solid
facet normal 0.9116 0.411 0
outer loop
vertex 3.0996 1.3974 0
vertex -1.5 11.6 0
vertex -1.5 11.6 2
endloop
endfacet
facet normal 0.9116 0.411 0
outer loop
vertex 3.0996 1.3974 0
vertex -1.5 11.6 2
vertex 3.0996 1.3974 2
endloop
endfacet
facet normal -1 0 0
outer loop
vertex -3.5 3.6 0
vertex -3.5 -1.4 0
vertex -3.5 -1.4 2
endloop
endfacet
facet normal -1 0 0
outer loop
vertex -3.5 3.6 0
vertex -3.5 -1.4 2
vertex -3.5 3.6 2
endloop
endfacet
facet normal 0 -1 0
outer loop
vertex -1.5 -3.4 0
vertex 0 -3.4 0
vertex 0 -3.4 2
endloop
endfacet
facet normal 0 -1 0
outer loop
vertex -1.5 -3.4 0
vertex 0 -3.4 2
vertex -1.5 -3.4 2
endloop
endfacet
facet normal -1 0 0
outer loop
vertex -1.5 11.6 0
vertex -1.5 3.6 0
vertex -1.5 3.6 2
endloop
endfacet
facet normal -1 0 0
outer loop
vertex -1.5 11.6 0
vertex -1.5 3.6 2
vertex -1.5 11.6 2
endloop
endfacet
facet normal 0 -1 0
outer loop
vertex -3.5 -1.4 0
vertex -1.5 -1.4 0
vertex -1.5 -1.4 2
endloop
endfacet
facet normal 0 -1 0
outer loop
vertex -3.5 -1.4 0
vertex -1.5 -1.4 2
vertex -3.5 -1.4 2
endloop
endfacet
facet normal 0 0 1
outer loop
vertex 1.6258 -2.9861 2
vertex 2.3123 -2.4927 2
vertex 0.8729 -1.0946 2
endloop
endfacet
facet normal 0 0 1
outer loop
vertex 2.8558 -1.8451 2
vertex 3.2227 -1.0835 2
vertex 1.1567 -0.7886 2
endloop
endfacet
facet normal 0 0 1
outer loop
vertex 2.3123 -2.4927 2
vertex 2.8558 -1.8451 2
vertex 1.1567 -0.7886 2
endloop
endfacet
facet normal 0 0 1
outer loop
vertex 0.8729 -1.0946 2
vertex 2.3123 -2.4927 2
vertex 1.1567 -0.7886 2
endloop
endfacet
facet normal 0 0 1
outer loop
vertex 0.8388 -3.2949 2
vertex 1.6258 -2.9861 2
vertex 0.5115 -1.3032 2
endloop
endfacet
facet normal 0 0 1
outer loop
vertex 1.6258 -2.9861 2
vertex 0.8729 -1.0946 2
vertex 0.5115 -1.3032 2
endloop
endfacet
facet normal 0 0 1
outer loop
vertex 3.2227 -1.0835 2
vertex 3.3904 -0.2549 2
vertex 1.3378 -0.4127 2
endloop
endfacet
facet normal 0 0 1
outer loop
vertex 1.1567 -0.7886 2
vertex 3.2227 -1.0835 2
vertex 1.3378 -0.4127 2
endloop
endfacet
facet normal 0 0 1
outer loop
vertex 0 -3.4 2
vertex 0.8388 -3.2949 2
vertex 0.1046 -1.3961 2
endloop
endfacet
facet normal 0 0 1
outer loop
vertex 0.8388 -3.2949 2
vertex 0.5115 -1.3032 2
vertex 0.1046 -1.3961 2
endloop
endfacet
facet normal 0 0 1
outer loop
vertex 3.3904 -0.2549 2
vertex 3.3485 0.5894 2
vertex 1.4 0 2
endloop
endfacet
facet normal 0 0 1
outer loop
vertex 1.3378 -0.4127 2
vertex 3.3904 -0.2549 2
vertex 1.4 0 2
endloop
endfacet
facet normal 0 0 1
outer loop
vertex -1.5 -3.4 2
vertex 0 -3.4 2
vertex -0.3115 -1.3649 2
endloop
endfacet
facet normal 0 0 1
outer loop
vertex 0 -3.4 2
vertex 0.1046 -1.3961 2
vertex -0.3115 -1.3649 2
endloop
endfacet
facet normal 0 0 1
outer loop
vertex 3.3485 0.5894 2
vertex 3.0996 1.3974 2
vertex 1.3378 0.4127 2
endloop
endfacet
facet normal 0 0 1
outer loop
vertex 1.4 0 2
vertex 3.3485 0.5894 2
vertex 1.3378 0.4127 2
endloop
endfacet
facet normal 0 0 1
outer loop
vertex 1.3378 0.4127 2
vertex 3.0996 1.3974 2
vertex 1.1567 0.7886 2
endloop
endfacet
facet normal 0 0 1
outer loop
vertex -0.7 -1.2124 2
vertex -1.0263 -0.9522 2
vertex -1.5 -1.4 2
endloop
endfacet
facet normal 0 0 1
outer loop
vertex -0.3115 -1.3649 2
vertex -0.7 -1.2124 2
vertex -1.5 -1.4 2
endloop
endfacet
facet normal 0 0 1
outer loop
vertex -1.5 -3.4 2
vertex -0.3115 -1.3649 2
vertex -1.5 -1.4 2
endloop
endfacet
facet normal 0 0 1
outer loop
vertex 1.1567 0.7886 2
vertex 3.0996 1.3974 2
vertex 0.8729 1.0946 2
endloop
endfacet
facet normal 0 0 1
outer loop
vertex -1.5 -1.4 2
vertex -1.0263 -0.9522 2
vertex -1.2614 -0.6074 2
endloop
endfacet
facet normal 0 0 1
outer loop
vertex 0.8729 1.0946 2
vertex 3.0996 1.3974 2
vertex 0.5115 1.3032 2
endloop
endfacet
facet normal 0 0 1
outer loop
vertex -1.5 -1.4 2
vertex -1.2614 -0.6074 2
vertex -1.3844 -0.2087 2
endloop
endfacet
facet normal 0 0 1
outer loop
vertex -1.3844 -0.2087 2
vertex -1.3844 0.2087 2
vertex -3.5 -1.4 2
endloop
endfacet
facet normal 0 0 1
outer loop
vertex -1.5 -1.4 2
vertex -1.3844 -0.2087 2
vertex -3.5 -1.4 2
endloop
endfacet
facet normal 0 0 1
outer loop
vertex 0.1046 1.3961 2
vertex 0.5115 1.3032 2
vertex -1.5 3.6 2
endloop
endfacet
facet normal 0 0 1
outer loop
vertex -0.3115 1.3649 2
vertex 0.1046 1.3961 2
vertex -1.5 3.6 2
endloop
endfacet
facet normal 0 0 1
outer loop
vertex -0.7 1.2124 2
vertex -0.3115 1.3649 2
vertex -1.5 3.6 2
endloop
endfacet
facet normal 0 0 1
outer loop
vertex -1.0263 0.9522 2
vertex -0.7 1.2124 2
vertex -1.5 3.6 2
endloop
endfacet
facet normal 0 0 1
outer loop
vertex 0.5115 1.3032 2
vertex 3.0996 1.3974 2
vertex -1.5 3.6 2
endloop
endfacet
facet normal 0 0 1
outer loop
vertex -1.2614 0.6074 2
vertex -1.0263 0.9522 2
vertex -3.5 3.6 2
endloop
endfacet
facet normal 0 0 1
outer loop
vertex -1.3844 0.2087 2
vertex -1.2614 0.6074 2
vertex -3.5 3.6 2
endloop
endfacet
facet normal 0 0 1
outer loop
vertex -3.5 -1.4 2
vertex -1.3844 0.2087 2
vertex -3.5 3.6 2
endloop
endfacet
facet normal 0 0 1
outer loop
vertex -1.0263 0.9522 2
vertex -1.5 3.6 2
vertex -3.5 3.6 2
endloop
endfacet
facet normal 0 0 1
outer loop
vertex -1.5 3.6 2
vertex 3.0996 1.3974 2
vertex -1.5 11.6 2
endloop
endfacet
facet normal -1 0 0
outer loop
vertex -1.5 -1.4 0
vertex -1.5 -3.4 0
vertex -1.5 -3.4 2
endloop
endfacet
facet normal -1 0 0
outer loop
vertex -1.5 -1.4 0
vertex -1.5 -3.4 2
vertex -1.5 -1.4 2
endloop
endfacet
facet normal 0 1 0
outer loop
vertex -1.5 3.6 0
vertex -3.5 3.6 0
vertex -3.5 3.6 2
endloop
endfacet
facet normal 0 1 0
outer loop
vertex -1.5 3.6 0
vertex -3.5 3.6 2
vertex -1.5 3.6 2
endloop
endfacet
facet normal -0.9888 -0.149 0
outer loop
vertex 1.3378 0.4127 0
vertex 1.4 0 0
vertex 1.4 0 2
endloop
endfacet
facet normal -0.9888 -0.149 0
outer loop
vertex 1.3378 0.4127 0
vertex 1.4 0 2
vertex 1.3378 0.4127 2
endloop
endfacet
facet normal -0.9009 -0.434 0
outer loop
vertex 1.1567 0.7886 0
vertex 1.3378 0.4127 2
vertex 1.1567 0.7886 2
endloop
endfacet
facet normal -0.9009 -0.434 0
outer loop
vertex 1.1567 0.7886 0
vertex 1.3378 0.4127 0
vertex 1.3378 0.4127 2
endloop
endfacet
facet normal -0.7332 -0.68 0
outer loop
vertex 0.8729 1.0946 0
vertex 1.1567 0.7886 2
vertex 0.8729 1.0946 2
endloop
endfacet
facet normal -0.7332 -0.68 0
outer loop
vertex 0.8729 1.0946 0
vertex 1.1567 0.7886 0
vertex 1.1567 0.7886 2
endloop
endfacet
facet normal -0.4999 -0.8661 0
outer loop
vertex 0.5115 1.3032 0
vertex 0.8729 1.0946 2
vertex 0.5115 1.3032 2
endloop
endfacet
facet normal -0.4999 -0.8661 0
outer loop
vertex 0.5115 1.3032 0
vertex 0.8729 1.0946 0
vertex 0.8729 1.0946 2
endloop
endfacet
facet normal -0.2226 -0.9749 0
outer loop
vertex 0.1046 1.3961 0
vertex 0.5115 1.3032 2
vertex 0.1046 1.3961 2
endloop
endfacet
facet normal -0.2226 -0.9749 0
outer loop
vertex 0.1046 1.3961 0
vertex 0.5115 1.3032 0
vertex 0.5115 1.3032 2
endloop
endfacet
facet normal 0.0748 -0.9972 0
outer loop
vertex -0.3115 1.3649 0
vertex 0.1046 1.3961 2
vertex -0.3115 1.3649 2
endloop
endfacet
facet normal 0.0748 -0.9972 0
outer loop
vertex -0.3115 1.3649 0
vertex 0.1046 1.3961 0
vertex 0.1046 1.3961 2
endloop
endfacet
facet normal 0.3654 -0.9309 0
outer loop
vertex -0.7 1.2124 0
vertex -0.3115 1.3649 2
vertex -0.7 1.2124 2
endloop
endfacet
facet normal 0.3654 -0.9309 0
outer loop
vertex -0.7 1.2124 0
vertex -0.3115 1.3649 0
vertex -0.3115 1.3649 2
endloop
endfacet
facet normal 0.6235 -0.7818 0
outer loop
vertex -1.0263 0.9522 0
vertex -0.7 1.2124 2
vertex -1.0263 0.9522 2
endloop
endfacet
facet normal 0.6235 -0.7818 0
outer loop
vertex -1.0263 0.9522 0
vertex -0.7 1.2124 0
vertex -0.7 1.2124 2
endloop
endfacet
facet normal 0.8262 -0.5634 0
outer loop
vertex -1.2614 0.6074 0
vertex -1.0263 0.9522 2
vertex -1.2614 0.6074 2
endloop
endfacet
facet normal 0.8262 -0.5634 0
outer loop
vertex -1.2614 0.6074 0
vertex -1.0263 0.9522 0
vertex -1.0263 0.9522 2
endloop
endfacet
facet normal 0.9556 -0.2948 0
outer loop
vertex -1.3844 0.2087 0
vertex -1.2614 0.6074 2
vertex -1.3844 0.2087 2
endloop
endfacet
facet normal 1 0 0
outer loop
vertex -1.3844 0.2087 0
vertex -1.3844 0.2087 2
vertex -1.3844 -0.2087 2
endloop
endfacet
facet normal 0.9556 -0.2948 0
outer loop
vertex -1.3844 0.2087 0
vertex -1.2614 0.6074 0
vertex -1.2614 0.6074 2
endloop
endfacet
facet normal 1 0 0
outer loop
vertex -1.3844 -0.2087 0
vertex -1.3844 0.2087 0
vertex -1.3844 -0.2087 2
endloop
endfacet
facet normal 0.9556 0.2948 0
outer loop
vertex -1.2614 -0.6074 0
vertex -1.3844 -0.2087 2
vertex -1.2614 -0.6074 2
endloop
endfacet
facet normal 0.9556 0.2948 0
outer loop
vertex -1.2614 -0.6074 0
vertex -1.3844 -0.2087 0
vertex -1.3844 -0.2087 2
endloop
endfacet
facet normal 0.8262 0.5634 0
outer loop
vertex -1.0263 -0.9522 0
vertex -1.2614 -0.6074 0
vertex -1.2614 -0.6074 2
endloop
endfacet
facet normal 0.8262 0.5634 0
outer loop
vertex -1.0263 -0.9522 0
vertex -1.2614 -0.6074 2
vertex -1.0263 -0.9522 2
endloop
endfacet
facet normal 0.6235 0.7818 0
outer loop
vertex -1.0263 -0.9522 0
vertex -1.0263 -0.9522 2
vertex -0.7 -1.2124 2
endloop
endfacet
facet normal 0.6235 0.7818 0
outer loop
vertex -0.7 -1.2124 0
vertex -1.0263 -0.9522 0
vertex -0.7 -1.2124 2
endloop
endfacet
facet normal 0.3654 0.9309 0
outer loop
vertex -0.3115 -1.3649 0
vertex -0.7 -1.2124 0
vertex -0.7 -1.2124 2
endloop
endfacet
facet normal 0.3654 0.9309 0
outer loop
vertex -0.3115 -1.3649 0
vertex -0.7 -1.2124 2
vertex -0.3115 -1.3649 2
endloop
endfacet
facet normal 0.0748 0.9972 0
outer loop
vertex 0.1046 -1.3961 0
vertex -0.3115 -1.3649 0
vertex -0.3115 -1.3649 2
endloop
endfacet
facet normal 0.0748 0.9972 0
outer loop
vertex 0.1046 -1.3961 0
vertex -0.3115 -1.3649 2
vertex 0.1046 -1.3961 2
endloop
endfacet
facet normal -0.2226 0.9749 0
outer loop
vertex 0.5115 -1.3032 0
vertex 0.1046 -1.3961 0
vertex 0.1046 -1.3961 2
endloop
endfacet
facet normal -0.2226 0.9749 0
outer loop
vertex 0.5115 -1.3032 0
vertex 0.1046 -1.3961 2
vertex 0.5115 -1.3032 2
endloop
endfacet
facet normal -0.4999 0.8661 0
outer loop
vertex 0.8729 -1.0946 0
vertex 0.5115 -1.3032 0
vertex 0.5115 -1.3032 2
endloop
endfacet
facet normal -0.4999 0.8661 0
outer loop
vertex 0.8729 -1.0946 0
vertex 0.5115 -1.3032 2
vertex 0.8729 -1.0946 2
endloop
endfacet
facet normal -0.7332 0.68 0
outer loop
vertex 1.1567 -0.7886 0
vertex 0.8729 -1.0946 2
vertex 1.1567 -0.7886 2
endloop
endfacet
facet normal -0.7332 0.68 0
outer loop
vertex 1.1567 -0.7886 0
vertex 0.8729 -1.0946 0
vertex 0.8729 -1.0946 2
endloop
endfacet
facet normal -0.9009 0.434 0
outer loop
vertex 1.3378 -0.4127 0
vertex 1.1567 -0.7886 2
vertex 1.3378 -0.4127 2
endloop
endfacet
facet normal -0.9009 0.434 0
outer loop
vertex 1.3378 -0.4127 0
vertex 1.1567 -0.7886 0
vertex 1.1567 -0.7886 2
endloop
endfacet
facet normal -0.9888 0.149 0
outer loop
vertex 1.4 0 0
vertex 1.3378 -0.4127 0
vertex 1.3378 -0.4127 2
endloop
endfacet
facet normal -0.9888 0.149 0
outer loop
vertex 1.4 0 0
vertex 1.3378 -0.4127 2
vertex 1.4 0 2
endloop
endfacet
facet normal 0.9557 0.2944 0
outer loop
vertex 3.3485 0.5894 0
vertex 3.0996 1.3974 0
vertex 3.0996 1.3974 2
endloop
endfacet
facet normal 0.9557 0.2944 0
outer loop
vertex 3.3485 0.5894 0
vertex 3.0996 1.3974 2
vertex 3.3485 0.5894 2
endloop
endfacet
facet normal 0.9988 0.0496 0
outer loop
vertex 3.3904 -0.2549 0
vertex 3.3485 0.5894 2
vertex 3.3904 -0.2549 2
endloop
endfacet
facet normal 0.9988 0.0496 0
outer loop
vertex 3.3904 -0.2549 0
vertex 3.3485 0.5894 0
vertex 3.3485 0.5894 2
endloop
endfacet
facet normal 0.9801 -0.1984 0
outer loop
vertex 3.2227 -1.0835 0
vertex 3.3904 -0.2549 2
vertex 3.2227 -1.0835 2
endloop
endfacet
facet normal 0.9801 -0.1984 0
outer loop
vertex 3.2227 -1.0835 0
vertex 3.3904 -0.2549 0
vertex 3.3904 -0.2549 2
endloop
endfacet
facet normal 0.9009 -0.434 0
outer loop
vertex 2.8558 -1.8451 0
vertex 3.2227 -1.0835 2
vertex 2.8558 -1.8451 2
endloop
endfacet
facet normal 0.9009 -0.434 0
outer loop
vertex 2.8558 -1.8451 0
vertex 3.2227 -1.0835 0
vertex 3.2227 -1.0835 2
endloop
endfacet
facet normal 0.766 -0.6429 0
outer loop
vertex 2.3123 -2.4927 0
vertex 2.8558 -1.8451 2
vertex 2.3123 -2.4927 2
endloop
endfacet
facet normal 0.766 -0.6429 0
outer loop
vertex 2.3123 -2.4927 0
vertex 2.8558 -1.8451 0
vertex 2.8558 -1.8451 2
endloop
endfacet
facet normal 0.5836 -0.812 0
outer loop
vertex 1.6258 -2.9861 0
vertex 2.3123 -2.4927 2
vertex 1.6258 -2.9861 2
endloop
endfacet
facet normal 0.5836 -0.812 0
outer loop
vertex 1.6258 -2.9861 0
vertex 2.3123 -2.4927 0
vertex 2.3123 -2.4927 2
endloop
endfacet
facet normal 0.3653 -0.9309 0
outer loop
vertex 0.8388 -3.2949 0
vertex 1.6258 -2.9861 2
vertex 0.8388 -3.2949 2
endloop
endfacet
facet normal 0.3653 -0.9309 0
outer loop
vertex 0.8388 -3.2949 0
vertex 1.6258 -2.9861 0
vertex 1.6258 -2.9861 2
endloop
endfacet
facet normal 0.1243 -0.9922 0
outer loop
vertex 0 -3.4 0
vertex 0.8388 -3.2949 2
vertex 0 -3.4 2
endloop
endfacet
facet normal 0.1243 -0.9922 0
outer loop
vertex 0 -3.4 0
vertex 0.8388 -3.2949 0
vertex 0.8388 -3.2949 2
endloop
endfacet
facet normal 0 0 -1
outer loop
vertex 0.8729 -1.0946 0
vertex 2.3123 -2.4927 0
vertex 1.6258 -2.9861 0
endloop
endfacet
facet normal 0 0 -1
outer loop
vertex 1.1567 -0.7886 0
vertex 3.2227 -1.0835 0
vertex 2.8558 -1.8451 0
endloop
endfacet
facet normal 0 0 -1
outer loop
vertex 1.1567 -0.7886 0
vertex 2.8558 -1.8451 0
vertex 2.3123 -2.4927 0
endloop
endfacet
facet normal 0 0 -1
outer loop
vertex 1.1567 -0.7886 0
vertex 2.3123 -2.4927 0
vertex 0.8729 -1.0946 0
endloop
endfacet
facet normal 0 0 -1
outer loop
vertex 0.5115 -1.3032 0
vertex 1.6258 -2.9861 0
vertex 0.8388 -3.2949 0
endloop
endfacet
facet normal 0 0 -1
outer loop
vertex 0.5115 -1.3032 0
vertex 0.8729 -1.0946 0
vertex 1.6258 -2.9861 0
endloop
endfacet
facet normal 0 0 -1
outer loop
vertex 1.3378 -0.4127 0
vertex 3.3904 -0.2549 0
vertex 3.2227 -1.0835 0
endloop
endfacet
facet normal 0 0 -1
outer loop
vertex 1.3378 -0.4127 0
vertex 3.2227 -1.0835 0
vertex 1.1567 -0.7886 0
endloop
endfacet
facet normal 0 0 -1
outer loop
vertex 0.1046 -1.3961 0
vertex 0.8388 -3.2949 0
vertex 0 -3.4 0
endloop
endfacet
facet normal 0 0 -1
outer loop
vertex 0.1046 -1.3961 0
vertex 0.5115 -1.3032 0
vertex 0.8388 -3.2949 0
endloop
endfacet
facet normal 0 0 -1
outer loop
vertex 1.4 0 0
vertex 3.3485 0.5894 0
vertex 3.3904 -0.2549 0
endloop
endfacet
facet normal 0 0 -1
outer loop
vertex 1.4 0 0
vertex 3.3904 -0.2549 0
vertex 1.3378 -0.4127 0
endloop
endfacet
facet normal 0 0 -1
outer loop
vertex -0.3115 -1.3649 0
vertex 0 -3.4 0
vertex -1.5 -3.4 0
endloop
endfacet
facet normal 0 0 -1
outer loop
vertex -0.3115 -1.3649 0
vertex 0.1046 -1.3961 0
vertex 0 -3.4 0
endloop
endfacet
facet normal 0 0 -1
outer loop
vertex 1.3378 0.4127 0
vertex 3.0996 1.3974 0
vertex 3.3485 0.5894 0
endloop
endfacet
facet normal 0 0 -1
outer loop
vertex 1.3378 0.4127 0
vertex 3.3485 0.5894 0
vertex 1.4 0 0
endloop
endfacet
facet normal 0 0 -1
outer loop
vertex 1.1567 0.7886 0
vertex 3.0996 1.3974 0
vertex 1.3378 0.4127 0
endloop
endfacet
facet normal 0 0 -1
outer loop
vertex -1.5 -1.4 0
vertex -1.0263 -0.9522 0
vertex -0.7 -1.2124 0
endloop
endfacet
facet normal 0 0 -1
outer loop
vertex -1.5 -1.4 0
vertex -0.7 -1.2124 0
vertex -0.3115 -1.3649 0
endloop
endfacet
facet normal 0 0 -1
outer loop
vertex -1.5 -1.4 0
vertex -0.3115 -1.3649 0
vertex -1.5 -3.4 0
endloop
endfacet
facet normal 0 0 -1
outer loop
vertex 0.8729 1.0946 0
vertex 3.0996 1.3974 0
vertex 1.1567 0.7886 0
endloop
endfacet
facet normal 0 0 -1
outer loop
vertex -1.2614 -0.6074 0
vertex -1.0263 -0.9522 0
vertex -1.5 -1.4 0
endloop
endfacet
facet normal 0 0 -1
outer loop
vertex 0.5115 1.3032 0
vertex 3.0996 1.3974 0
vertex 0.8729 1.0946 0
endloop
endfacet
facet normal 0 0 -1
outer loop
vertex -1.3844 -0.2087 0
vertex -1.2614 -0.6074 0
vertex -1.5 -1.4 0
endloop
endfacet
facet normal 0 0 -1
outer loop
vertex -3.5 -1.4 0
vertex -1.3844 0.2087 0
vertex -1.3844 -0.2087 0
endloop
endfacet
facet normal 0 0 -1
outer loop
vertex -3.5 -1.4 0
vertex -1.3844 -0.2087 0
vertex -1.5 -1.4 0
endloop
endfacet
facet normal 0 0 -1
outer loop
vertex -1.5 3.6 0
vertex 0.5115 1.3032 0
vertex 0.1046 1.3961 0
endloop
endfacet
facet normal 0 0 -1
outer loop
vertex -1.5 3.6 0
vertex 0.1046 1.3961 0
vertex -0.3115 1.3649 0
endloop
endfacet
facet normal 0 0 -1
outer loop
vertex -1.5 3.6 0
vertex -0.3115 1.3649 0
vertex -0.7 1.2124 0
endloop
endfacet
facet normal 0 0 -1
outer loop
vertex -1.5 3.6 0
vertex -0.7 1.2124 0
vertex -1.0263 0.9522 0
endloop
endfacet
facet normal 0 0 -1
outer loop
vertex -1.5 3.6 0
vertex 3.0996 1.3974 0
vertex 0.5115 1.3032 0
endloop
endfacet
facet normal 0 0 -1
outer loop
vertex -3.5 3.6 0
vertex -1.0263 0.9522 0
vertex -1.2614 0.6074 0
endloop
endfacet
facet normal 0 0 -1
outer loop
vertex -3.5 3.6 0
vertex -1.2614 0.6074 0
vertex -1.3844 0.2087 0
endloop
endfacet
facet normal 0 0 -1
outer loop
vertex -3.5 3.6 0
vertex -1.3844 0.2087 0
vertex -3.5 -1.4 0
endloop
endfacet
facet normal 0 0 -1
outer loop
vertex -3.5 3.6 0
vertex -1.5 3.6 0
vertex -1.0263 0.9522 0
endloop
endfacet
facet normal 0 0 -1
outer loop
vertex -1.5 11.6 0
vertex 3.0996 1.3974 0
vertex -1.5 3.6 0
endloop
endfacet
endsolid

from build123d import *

# Parameters (mm, degrees)
SKETCH1_R           = 1.4
BOSS_EXTRUDE1_DEPTH = 2


with BuildPart() as part:
    # Sketch1 → Boss-Extrude1 (new body)
    with BuildSketch(Plane.XY):
        with BuildLine():
            Line((-1.5, -3.4), (-1.5, -1.4))
            Line((-1.5, -1.4), (-3.5, -1.4))
            Line((-3.5, -1.4), (-3.5, 3.6))
            Line((-3.5, 3.6), (-1.5, 3.6))
            Line((-1.5, 3.6), (-1.5, 11.6))
            Line((-1.5, 11.6), (3.099578521, 1.397359292))
            ThreePointArc((3.099578521, 1.397359292), (2.855785495, -1.845125796), (0, -3.4))
            Line((0, -3.4), (-1.5, -3.4))
        make_face()
        Circle(SKETCH1_R, mode=Mode.SUBTRACT)
    extrude(amount=BOSS_EXTRUDE1_DEPTH)


solid = part.part
